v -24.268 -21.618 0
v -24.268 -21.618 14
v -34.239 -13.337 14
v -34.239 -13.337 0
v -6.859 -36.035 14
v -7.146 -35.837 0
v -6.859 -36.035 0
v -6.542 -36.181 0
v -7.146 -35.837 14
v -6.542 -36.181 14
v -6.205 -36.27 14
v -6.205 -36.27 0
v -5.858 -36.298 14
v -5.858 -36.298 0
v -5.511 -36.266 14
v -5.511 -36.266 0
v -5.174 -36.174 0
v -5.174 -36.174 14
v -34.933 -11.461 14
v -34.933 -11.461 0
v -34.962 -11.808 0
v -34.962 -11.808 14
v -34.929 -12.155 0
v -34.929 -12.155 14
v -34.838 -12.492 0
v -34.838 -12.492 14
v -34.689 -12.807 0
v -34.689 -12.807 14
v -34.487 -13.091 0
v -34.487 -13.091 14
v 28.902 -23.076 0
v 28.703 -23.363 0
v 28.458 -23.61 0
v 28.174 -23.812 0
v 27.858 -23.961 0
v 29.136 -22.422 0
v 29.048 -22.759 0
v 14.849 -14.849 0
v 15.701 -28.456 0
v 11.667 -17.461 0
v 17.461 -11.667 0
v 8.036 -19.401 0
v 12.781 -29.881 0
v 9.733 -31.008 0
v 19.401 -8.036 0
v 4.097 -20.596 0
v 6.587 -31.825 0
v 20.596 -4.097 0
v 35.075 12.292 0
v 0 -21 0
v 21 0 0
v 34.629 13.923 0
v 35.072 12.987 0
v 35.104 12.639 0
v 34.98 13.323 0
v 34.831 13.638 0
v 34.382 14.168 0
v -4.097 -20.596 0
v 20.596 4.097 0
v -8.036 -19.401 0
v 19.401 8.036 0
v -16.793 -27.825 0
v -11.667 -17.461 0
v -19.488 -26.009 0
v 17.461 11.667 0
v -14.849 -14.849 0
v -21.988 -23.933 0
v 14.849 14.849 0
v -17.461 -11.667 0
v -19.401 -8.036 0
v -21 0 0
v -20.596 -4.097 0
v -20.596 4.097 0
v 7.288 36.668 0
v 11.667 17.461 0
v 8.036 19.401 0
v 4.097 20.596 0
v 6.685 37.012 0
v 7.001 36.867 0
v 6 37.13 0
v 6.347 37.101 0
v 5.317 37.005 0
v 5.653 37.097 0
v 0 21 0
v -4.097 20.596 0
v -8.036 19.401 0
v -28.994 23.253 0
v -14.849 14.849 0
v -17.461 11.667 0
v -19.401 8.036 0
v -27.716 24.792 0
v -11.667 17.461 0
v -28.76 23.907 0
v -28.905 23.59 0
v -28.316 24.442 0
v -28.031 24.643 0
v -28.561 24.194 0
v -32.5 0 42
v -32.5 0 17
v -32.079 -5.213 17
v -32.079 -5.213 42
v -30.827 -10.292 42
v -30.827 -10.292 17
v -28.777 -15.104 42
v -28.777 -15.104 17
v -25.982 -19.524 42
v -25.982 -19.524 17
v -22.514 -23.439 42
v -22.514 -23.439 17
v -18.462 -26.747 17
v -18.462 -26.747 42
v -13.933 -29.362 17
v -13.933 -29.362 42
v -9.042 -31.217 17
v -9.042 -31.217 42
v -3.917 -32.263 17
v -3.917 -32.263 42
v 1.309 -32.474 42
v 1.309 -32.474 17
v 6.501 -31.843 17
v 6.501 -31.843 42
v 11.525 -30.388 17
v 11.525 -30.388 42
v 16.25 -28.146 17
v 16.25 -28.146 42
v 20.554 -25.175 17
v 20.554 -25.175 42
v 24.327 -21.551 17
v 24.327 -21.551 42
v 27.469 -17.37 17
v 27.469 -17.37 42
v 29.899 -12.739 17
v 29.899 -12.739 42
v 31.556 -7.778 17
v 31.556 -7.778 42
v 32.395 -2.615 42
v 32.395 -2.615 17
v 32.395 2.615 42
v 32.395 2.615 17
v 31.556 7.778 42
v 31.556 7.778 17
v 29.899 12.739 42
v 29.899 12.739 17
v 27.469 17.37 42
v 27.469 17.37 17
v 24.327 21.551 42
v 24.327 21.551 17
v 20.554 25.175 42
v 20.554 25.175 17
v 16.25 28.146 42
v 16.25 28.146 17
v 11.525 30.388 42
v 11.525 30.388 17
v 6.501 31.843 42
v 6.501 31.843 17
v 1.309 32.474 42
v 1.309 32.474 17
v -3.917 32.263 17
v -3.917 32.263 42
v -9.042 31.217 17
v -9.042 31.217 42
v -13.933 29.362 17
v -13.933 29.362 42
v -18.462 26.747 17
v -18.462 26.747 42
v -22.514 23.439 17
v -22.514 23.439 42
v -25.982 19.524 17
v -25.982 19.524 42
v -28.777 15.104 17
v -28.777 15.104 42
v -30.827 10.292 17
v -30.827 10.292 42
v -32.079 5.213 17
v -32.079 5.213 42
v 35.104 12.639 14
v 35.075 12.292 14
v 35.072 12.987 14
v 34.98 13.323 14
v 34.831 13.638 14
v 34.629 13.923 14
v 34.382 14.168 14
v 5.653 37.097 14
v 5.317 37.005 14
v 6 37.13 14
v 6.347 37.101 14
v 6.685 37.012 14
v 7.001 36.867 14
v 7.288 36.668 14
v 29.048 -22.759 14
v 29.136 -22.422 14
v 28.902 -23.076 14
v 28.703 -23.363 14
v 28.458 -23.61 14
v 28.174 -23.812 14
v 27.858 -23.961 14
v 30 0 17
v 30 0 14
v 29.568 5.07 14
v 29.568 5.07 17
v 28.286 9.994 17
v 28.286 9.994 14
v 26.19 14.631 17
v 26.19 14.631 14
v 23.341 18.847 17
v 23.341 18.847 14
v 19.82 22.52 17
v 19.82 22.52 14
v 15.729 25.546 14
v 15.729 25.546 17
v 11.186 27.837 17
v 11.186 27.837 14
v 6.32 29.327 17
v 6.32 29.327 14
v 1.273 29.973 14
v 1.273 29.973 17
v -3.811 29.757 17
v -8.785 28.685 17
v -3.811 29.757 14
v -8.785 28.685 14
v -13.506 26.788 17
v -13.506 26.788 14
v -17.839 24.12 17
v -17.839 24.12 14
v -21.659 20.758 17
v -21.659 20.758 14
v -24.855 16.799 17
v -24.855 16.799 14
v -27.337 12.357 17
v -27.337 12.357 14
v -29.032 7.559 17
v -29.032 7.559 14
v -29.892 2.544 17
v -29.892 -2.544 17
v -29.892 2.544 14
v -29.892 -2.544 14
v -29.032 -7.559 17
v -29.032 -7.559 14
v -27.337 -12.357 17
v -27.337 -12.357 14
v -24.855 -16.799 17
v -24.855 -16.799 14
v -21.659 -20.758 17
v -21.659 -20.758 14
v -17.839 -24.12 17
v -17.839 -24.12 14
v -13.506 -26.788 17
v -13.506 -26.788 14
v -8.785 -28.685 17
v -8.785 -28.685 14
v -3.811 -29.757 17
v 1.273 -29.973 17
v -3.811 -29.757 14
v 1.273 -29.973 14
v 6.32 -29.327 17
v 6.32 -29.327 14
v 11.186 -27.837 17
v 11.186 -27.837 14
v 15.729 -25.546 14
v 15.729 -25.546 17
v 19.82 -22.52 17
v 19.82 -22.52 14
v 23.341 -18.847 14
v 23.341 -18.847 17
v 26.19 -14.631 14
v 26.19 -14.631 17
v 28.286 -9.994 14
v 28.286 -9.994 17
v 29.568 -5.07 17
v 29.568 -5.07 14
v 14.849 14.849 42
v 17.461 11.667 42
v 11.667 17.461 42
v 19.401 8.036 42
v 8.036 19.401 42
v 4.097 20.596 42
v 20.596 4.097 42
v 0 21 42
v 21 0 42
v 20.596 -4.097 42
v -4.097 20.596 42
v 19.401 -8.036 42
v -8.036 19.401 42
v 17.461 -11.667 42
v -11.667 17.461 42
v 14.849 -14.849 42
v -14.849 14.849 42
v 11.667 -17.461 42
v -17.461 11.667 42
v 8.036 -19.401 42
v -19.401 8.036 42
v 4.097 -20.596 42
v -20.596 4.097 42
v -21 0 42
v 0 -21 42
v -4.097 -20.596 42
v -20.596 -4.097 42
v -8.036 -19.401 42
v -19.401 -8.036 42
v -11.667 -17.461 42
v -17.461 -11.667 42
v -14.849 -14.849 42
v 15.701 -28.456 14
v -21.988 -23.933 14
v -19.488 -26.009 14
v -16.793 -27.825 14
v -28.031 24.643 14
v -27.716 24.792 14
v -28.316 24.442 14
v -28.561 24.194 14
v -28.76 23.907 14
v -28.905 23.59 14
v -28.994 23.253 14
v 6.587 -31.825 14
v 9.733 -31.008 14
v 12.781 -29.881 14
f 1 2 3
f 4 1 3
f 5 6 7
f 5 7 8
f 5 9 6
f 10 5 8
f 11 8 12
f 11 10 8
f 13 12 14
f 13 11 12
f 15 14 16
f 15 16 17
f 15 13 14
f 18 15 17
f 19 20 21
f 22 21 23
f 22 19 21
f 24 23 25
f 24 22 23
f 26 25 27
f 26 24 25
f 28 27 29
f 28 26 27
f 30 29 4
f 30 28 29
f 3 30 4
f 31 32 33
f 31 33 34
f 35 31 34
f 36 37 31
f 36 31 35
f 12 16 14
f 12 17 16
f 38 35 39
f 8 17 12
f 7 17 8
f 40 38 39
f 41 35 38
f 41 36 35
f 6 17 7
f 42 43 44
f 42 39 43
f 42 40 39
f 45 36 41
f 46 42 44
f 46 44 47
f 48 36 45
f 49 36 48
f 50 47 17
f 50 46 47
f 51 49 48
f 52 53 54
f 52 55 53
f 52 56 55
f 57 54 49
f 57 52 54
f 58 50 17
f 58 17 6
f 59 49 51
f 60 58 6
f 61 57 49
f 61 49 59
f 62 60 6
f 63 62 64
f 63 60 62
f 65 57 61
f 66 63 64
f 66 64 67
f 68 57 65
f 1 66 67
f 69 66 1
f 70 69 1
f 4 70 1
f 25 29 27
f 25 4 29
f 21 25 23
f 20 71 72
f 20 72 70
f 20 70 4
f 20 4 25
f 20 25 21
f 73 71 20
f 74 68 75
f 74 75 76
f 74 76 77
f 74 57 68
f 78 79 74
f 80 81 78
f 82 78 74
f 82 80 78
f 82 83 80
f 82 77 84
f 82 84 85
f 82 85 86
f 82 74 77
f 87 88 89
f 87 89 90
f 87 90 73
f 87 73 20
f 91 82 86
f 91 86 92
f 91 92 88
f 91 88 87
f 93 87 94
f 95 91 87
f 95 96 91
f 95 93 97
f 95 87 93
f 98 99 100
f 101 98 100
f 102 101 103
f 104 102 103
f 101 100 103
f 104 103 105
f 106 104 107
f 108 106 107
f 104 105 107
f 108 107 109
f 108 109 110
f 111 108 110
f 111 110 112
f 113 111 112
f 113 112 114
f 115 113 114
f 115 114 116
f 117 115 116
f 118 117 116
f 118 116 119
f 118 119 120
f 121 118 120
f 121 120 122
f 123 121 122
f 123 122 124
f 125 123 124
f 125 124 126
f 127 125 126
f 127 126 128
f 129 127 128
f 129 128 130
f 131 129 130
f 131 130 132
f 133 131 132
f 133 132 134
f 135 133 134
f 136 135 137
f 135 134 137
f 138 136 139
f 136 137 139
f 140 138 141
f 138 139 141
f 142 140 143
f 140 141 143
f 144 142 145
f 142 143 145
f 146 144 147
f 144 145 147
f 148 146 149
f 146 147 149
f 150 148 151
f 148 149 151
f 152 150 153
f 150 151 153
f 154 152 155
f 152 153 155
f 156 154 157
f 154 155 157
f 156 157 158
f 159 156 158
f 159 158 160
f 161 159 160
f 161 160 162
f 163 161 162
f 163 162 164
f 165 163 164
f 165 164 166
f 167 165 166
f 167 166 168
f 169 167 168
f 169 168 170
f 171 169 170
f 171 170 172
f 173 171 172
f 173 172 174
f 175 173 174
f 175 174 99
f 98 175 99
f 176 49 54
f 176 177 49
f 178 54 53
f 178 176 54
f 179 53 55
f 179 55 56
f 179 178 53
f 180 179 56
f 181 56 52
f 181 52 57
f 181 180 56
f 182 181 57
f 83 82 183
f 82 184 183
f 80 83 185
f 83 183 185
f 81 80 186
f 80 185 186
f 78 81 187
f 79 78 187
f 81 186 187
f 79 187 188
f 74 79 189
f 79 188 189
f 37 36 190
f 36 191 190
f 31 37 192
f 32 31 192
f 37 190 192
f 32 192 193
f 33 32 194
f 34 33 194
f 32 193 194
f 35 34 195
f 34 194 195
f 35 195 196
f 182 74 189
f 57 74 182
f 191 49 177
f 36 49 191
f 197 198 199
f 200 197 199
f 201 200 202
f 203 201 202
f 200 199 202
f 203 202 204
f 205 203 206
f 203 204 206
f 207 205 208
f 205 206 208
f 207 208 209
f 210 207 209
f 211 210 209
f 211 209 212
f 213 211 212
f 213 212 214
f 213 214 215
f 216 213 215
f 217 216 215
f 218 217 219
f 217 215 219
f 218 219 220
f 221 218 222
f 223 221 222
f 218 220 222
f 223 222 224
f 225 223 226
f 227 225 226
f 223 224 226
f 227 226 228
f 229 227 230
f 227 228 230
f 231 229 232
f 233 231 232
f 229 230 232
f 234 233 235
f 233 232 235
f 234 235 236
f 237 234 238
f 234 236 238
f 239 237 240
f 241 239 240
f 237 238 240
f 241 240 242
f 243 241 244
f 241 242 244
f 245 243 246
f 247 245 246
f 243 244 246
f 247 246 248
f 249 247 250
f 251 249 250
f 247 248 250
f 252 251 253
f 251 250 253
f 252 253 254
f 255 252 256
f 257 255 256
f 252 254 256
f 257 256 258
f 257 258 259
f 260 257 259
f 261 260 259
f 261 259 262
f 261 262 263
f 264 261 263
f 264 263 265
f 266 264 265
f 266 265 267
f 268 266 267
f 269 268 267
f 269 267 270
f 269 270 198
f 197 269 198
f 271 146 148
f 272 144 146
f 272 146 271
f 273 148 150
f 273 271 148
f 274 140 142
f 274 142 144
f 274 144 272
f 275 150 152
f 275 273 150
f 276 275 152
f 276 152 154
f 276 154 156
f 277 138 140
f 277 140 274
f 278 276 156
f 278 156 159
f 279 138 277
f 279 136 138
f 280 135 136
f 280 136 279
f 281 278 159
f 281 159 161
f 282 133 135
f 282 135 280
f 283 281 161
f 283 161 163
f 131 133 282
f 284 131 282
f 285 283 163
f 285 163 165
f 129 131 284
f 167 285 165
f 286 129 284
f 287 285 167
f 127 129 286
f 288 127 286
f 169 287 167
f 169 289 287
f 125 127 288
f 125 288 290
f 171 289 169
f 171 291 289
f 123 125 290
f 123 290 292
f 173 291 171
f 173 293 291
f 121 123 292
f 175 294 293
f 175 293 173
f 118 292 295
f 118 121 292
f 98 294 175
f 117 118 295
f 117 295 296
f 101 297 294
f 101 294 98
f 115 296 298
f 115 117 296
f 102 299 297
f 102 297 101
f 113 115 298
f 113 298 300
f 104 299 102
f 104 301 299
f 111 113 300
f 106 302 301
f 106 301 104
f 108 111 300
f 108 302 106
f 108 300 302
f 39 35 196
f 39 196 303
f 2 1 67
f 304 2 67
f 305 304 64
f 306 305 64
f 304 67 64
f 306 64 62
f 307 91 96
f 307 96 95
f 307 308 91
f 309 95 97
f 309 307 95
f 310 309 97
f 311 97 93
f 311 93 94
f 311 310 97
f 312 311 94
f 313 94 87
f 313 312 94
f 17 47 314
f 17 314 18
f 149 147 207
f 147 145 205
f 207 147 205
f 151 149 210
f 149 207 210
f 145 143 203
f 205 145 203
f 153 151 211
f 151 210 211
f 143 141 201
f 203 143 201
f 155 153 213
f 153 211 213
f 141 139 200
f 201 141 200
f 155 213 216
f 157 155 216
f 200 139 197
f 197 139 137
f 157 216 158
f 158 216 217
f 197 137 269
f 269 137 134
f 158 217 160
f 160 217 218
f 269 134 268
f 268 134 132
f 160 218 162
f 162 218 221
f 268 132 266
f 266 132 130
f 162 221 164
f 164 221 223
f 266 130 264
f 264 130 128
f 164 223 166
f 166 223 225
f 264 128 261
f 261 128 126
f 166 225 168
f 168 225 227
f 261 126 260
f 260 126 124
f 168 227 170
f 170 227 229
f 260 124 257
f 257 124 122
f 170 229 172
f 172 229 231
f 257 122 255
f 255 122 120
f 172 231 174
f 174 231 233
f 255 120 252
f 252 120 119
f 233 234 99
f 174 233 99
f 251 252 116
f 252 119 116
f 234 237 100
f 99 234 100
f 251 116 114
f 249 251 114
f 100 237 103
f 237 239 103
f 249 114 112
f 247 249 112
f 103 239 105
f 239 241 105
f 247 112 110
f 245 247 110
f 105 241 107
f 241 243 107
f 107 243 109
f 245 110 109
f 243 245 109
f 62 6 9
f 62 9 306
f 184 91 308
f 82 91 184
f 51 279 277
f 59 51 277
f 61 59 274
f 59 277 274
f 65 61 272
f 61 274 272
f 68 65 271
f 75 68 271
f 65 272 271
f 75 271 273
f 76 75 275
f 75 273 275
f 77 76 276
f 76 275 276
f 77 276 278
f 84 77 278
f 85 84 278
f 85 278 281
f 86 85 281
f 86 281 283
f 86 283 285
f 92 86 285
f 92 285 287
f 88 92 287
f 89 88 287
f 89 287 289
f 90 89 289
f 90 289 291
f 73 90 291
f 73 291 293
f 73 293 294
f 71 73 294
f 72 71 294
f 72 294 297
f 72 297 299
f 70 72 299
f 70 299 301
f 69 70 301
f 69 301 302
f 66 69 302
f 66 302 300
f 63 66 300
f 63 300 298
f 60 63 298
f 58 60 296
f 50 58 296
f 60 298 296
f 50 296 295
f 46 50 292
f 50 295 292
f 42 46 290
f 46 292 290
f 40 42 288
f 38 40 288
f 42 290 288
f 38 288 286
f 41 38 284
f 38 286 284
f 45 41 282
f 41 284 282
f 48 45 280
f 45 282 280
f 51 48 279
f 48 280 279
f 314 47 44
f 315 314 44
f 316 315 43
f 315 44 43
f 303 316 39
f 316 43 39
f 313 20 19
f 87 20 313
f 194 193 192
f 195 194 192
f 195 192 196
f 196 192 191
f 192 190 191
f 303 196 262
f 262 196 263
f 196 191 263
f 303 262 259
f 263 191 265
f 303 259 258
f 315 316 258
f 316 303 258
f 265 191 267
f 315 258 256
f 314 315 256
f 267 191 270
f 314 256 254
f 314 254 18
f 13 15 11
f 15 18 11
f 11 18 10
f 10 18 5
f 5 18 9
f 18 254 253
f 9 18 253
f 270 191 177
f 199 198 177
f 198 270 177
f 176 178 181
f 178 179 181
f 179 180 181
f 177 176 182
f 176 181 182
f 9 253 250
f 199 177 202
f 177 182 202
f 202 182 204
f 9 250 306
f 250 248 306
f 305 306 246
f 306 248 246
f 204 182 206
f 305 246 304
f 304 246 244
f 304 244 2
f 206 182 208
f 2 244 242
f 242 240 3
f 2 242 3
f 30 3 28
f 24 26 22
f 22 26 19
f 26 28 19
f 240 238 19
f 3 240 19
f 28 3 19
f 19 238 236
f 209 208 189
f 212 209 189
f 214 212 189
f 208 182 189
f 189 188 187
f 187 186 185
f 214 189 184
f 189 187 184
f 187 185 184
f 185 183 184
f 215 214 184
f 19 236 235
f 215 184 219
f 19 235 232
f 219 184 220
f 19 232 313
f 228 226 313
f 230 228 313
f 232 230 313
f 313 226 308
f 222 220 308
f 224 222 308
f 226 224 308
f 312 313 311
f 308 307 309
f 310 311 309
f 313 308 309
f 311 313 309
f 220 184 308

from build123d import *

# Parameters (mm, degrees)
SKETCH1_R           = 32.5
BOSS_EXTRUDE1_DEPTH = 42
CUT_EXTRUDE1_START  = -28
SKETCH2_R           = 32.5
SKETCH2_R_2         = 30
CUT_EXTRUDE1_DEPTH  = 3
BOSS_EXTRUDE2_DEPTH = 14
FILLET1_R           = 2
SKETCH4_R           = 21
CUT_EXTRUDE2_DEPTH  = 67.142933871


with BuildPart() as part:
    # Sketch1 → Boss-Extrude1 (new body)
    with BuildSketch(Plane.XY):
        with Locations(Location((0, 0, 0), (0, 0, 180))):
            Circle(SKETCH1_R)
    extrude(amount=BOSS_EXTRUDE1_DEPTH)

    # Sketch2 → Cut-Extrude1 (cut)
    with BuildSketch(Plane.XY.offset(42).offset(CUT_EXTRUDE1_START)):
        with Locations(Location((0, 0, 0), (0, 0, 180))):
            Circle(SKETCH2_R)
        Circle(SKETCH2_R_2, mode=Mode.SUBTRACT)
    extrude(amount=CUT_EXTRUDE1_DEPTH, mode=Mode.SUBTRACT)

    # Sketch3 → Boss-Extrude2 (add)
    with BuildSketch(Plane(origin=(0, 0, 0), x_dir=(-1, 0, 0), z_dir=(0, 0, -1))):
        Polygon((-35.269916777, 13.430130963), (-28.941400728, -23.560181525), (6.257407604, -36.574682103), (35.127699889, -12.598870193), (28.799183841, 24.391442295), (-6.399624492, 37.405942873), align=None)
    extrude(amount=-BOSS_EXTRUDE2_DEPTH)

    # Fillet1
    fillet1_edges = [part.edges().sort_by_distance(p)[0] for p in [
        (-28.799183841, 24.391442295, 7),
        (-35.127699889, -12.598870193, 7),
        (-6.257407604, -36.574682103, 7),
        (28.941400728, -23.560181525, 7),
        (35.269916777, 13.430130963, 7),
        (6.399624492, 37.405942873, 7),
    ]]
    fillet(fillet1_edges, radius=FILLET1_R)

    # Sketch4 → Cut-Extrude2 (cut, through all)
    with BuildSketch(Plane.XY.offset(42)):
        Circle(SKETCH4_R)
    extrude(amount=-CUT_EXTRUDE2_DEPTH, mode=Mode.SUBTRACT)


solid = part.part
